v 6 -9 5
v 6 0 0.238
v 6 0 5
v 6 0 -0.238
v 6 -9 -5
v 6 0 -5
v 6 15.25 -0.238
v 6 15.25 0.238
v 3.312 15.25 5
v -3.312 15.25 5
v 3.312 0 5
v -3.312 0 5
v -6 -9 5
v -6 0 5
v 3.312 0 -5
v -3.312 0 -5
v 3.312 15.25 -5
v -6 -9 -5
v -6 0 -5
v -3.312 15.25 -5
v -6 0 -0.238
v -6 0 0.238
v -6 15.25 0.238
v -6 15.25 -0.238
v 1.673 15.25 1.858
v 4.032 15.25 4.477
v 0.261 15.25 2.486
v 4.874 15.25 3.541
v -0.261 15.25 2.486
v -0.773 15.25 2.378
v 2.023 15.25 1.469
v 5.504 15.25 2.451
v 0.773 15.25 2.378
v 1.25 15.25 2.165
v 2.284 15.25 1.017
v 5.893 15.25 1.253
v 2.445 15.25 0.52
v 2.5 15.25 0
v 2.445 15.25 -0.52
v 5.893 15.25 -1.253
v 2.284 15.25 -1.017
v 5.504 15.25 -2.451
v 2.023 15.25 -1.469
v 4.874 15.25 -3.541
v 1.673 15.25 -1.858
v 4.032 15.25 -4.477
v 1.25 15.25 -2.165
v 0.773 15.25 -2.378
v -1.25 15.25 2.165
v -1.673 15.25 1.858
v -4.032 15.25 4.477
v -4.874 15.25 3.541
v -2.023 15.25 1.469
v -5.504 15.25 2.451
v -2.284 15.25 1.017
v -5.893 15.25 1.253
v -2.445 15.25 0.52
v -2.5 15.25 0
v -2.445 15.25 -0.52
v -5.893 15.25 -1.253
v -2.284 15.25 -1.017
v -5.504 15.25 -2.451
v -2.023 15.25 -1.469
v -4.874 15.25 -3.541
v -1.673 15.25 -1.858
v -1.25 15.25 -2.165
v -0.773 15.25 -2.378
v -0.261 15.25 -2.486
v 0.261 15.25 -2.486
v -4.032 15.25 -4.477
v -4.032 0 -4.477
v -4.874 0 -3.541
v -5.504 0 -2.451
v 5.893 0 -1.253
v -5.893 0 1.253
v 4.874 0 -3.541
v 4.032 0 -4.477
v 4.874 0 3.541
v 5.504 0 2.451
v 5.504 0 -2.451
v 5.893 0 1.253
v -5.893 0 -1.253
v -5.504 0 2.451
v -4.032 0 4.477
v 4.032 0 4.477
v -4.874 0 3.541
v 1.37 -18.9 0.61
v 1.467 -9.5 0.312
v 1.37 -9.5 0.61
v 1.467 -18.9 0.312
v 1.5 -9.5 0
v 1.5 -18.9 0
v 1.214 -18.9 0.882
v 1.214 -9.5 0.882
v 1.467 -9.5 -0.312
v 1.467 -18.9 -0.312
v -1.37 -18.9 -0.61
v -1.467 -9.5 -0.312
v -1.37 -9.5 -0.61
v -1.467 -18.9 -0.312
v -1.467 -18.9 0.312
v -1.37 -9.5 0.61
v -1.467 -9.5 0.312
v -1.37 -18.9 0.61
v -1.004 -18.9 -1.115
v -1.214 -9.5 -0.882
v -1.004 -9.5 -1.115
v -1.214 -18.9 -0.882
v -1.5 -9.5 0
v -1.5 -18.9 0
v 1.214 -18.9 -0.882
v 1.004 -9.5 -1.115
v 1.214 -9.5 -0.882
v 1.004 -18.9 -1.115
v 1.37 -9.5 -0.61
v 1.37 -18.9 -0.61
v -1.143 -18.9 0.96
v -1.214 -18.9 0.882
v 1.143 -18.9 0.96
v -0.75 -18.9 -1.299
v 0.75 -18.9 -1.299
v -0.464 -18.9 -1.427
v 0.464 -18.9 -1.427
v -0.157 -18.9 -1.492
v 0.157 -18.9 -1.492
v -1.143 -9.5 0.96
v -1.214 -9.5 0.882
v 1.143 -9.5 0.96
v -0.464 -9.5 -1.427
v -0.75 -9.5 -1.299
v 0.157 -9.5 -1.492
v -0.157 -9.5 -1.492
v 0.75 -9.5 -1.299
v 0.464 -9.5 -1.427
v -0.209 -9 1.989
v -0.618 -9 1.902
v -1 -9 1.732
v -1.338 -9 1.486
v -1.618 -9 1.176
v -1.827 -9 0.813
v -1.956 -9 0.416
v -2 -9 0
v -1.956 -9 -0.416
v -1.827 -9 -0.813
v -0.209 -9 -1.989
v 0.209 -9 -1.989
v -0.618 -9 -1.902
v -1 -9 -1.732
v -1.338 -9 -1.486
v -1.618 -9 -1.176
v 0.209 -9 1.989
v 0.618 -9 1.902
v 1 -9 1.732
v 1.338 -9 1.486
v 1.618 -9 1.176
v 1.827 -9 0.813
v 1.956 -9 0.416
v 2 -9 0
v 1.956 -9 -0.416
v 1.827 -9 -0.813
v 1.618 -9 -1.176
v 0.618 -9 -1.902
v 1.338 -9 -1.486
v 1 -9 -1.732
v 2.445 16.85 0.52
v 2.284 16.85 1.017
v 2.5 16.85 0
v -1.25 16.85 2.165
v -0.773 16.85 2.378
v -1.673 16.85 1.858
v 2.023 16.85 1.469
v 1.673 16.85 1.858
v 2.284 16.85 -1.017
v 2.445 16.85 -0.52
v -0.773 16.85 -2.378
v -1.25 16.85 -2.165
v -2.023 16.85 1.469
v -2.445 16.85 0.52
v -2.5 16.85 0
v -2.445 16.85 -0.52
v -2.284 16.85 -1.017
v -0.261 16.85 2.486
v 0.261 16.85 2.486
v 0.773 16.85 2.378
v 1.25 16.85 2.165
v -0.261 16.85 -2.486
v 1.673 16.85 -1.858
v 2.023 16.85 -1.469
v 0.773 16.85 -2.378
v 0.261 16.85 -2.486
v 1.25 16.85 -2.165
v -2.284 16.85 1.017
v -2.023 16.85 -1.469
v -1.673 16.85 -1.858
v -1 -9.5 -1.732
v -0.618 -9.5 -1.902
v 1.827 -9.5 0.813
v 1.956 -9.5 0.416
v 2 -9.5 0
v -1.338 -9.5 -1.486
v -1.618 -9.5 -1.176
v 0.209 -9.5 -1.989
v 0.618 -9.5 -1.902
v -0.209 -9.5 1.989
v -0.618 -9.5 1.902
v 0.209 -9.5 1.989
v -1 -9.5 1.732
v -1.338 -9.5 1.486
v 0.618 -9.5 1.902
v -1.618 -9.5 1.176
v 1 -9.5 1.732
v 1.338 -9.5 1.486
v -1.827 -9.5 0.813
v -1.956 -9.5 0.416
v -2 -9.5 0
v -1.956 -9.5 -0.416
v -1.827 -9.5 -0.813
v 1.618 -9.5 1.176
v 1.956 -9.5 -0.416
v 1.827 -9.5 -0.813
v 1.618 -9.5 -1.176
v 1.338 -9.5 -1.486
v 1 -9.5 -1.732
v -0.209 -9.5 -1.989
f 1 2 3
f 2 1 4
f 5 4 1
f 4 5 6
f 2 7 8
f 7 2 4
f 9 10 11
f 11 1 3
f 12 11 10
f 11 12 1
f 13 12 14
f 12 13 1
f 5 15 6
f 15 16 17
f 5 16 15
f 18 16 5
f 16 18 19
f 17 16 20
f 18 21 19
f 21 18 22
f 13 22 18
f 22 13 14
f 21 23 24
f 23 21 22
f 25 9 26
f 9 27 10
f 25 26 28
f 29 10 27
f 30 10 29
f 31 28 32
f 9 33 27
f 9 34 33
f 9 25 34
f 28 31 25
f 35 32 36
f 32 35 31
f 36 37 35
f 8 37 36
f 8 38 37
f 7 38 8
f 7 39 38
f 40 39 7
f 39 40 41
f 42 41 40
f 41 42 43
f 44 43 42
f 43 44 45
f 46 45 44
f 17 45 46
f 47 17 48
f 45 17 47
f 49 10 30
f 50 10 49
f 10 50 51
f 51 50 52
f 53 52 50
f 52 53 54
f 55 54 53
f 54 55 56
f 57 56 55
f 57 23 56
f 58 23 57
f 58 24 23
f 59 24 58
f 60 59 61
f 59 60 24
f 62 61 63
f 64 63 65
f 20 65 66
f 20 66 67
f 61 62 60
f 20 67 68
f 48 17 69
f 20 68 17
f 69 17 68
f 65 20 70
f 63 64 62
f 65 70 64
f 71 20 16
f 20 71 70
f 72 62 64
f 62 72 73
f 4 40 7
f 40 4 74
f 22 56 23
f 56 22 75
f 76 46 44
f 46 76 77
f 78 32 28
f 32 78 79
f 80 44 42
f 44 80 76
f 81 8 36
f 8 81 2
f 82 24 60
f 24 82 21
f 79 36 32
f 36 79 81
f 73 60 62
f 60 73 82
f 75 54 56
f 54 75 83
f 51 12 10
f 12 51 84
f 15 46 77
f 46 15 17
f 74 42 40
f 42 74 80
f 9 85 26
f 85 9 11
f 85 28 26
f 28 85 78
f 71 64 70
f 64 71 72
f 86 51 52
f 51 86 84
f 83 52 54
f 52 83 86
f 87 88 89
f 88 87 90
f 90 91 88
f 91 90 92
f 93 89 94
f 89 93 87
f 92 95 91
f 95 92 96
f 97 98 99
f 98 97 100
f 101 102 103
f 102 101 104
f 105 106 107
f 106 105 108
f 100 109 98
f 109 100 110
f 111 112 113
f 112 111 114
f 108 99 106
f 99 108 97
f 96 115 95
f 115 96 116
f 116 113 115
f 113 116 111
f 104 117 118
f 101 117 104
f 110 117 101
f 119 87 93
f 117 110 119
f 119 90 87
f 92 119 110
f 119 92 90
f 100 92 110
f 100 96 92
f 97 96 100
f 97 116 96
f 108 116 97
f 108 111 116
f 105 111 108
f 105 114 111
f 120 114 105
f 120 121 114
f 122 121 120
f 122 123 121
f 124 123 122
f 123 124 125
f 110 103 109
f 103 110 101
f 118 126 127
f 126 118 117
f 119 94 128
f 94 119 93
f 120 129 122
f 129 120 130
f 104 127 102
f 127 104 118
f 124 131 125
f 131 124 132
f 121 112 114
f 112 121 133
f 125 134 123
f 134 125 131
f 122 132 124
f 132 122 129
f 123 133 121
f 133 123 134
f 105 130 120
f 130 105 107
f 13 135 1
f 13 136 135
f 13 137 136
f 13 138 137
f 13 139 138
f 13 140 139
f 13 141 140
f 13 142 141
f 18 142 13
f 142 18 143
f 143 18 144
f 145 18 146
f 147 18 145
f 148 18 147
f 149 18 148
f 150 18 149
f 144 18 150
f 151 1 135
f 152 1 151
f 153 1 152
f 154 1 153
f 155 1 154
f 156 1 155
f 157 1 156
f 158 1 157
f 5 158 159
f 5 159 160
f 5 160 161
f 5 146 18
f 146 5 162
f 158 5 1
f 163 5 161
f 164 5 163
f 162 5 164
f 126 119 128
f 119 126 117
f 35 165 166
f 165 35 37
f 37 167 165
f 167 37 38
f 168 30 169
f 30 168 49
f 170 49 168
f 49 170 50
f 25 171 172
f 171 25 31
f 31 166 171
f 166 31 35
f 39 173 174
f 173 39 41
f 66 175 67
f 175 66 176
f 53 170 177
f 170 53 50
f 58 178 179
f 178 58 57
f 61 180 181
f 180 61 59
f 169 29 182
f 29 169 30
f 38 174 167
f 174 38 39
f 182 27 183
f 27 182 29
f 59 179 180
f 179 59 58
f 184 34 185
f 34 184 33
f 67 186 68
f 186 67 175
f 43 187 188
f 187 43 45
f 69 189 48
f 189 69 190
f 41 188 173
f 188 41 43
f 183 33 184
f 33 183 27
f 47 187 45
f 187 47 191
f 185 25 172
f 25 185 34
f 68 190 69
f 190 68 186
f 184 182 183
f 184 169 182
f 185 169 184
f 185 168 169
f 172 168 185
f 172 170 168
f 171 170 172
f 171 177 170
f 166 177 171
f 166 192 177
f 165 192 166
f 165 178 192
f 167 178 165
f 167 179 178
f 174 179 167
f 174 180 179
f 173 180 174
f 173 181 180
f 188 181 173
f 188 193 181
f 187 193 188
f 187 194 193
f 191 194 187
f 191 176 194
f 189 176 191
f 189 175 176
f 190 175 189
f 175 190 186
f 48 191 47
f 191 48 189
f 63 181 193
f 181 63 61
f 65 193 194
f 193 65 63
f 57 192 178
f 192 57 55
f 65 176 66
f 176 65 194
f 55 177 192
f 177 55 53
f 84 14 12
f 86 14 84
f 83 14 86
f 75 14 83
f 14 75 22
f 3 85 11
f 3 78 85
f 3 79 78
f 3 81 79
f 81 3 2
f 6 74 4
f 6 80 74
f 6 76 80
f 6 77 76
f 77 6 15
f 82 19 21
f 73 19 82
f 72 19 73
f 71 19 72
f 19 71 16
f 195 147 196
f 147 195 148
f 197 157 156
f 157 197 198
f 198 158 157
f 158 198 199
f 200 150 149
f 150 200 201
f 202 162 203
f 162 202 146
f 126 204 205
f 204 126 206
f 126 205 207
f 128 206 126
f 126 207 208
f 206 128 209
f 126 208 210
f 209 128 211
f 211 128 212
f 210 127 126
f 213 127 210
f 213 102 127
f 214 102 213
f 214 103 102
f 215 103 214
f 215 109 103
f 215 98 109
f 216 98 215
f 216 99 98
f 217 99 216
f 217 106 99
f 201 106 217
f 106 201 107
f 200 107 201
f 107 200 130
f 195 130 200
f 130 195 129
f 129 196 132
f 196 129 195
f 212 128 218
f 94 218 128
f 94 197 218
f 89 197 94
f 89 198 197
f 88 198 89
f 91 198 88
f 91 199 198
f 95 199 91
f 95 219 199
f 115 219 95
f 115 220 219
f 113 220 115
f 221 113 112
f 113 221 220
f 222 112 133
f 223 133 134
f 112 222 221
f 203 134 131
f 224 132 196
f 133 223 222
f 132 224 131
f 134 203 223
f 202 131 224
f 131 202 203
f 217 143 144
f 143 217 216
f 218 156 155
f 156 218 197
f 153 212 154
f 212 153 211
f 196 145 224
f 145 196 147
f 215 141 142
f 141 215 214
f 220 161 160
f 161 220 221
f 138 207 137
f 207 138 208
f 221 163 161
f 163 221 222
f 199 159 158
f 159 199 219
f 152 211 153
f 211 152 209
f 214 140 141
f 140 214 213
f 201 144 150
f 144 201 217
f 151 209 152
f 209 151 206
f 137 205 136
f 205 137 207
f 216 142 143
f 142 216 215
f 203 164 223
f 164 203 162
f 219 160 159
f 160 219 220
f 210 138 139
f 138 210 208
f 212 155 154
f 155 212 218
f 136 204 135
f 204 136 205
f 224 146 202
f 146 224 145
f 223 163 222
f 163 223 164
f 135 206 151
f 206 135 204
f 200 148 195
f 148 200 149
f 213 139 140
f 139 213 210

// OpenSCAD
// file: ../settings.scad
// Common settings used by all scad files.

// ALL UNITS IN MILLIMETERS (MM)!!!

$fn = 30;//low-res but fast to render
//$fn = 50;//higher-res but slow to render

pi = 3.1415926535897932384626433832795;

max_footprint = 150; // 15x15 cm

bottom_clearance = 10;
bottom_clearance = 25.4/2+10;
//bottom_clearance = 30;

shell_alpha = 0.215;
//shell_alpha = 1.0;

tolerance = 0.5;

// Flat countersunk M2.5mm x 0.45mm machine screw.
screw_thread_diameter = 2.5;//2.8;//2.75;//2.4?
screw_thread_length = 5;//?
screw_head_diameter = 4.75; // M2.5
//screw_head_diameter = 5.2; // M3
screw_head_height = 1.5;//2;

screw_thread_diameter2 = 2;

unit_thickness = 5;
u = unit_thickness;

shell_thickness = unit_thickness;

// Show flags.
show_platform = 0;
show_head = 1;
show_head_shell = 0;
show_head_electronics_bb = 0;
show_battery = 1;
show_foot_cube = 0;
show_torso = 0;
show_motor = 0;
show_motor_plates = 1;
show_motor_inner_plates = 1;
show_motor_outer_plates = 1;
show_wheel = 0;//obsolete
show_tracks = 1;//
show_track_wheels = 1;
show_caster = 0;
show_rpi = 1;
show_vertical_plates = 1;//
show_horizontal_plates = 1;//
show_caster_plates = 0;//obsolete?
show_camera = 1;
show_screen = 0;
show_edge_mount = 1;
show_sonar_mount = 1;
show_recharge_mount = 1;
show_conduit = 1;
show_torso_shell = 1;
show_recharge_dock = 0;
show_head_tilt_axis = 0;
show_rpi_camera_axis = 0;
show_laser_axis = 0;

head_vertical_angle_tilt = 0;
//head_vertical_angle_tilt = 30;//max
//head_vertical_angle_tilt = 10;

torso_height = 120+20;

base_plate_diameter = max_footprint-unit_thickness*2;
base_plate_frame = 0;

head_height = 50;
head_offset_z = max_footprint/2;
head_middle_cutout = 85;

rpi_with_four_hats_and_clearance = 76;

qrd1114_w = 6.10;
qrd1114_l = 4.39;
qrd1114_h = 4.65;

dock_radius = 10;
dock_gripper_border = 2;
dock_gripper_instep = 0.9;
dock_gripper_cutout_tapper = 50;
dock_receiver_height = 5;

// Patriod Fuel+ 9000 mAh
battery_length = 90;
battery_width = 57;
battery_height = 23;
battery_offset_z = 30;//4;

wheel_diameter = 50;
wheel_offset_x = 65;
wheel_offset_z = wheel_diameter/2;
wheel_axle_diameter = 5;

//caster_diameter = 19.05; // 0.75 inches
caster_diameter = 25.45; // 1 inches
//caster_diameter = 15.875; // 5/8 inches
caster_holder_diameter = 30;//31;
caster_offset_y = base_plate_diameter/2 - caster_holder_diameter/2;

arduino_offset_x = 0;
arduino_offset_y = 0;
arduino_offset_z = 67;
arduino_offset_x2 = 0;
arduino_offset_y2 = -20;
arduino_offset_z2 = torso_height+bottom_clearance;

horizontal_plate_width = unit_thickness*8*2 - unit_thickness*2;
horizontal_plate_depth = unit_thickness*8*2;

vertical_plate_width = horizontal_plate_depth;
vertical_plate_height = unit_thickness*8;
vertical_plate_offset_x = wheel_offset_x-22.5;
vertical_plate_offset_z = vertical_plate_height/2 + unit_thickness/2;

vertical_battery_plate_height = 100 - 15;

caster_plate_width = horizontal_plate_width + unit_thickness*2;
caster_plate_mount_length = unit_thickness*4;
caster_plate_width_minor = caster_holder_diameter;

motor_switch_length = 20;
motor_switch_thickness = 6.5;
motor_switch_height = 11;
motor_switch_height_leads = 23;
motor_switch_on_height =  13.3;
motor_switch_hole_diameter = 2.5;
motor_switch_hole_offset_z = 6.5;//this plus diameter/2 is hole center from switch top
motor_switch_hole_spacing = 7.1;// holes are diameter/2 from this

motor_length = 60;
motor_width = 25;
motor_collar_width = 7;
motor_collar_height = 2.5;
motor_axle_width = 4;
motor_axle_height = 9.5;
motor_offset_x = 10;
//motor_offset_y = motor_width/2+5;
motor_offset_y = unit_thickness*3.5;
motor_offset_z = vertical_plate_height/2 - unit_thickness/2;//4;//30;
motor_mount_holes_dist = 17;
// motor countersink hole
motor_mount_holes_width = 3; // M3
motor_mount_holes_head_height = 2.2;
motor_mount_holes_head_width = 5.8;
motor_bearing_outer_diameter = 10;
motor_bearing_inner_diameter = 5.95;
motor_bearing_thickness = 2.5;

motor_unimount_idler_axle_d = screw_thread_diameter;
//motor_unimount_spacer_depth = 0.1;//too small
motor_unimount_spacer_depth = 0.5;

motor_arm_offset_y = -u*3;
motor_arm_offset_z = u*.5;

motor_plate_width = vertical_plate_width;
motor_plate_height = vertical_plate_height;
motor_plate_thickness = unit_thickness;
motor_plate_offset_z = vertical_plate_offset_z;

motor_plate_middle_thickness = 5;

wheel_hub_offset = u*3;

motor_hole_height_offset = -5;

nylon_spacer_outer_diameter = 6.35;
nylon_spacer_inner_diameter = 3.302;
nylon_spacer_length = 12.7;

track_width = unit_thickness*3;
track_offset_x = -50;
track_offset_z = .1;
//track_wheel_radius = 19;//original
track_wheel_radius = 14;
//track_wheel_hole_radius = (nylon_spacer_outer_diameter+1)/2;
track_wheel_hole_radius = motor_bearing_outer_diameter/2;

track_driver_hole_radius = (motor_axle_width)/2 + 0.1;
track_driver_set_screw_head_d = 4.1;
track_driver_set_screw_shaft_d = 2.4;
//track_wheel_width = 13.5;//original
track_wheel_width = u*2;
track_wheel_width_buffer = u*0.25;
track_offset = 3;        //distance from chassis
track_wheel_offset = track_offset;
//track_length = 250; // see tread_triangle.py, too big
//track_length = 240; // see tread_triangle.py
//track_length = 238; //inc/dec in 10 unit increments so notches match idlers
track_length = 228; //inc/dec in 10 unit increments so notches match idlers
track_radius = track_length/2/pi;
track_wheel_show_fancy = 1;
track_wheel_gap = track_wheel_width + track_wheel_width_buffer*2;
track_axle_bearing_diameter = motor_bearing_inner_diameter - 0.1;
track_tensioner_radius = 12;
track_nut_height = 3.5; //TODO
track_punchout_thickness = 0.25;//should be the same as the minimum layer thickness

head_slew_bearing_outer_diameter = 115;
head_slew_bearing_ring_thickness = 20;
head_slew_bearing_inner_diameter = head_slew_bearing_outer_diameter - head_slew_bearing_ring_thickness;
//head_slew_bearing_hole_diameter = head_slew_bearing_inner_diameter - head_slew_bearing_ring_thickness;
head_slew_bearing_hole_diameter = 12+tolerance; // slip ring https://www.adafruit.com/products/775
//head_slew_bearing_ball_diameter = 5;
head_slew_bearing_ball_diameter = 2.5; //u/2;
head_slew_bearing_height = u;//head_slew_bearing_ball_diameter*2;
head_slew_bearing_gap = 0.5;
head_slew_bearing_slew_gap = 0;
head_slew_bearing_gap_factor = 0.1;

neck_strut_width = u*7;
neck_strut_height = u*18;
neck_strut_spacing = u*8;

show_outer_race = 0;
show_inner_race_a = 1;
show_inner_race_b = 1;
show_balls = 0;
// main file
include <../settings.scad>;

module make_motor(flip=0){
    rotate([0,90+(180*flip),0]){
        
        difference(){
            cylinder(h=motor_length, d=motor_width, center=true);
            
            translate([motor_mount_holes_dist/2,0,motor_length/2])
            cylinder(h=motor_length, d=motor_mount_holes_width, center=true);
            
            translate([-motor_mount_holes_dist/2,0,motor_length/2])
            cylinder(h=motor_length, d=motor_mount_holes_width, center=true);
        }
        
        translate([0,0,motor_collar_height/2+motor_length/2])
        cylinder(h=motor_collar_height, d=motor_collar_width, center=true);
        
        translate([0,0,motor_axle_height/2+motor_collar_height/2+motor_length/2])
        cylinder(h=motor_axle_height, d=motor_axle_width, center=true);
    }
}

module make_pololu_motor_163F3F_axle(d=3, h=9.9){
    notch_thickness = 2.46;
    difference(){
        color("red")
        cylinder(d=d, h=h);
        color("blue")
        translate([0,notch_thickness,0])
        cube([d,d,d*h], center=true);
    }
}

module make_pololu_motor_163F3F(){
    //https://www.pololu.com/product/2361
    //24.25
    //25.5
    gearbox_length = 9;
    housing_length = 15.25;
    housing_d = 12.05;
    union(){
    
        // motor housing
        translate([0,housing_length/2-1/2,0])
        intersection(){
            cube([12, housing_length+1, 10], center=true);
            rotate([90,0,0])
            cylinder(d=housing_d, h=housing_length+1, center=true);
        }
        translate([0,housing_length+1.6,0])
        rotate([90,0,0])
        cylinder(d=5, h=1.6);
    
        // gear box
        translate([0,-gearbox_length/2,0])
        cube([12, gearbox_length, 10], center=true);
        
        // axle collar
        translate([0,-gearbox_length,0])
        rotate([90,0,0])
        cylinder(d=4, h=0.5);
        
        // axle
        translate([0,-gearbox_length,0])
        rotate([90,0,0])
        //cylinder(d=3, h=9.9);
        make_pololu_motor_163F3F_axle();
    }
}

//make_motor();
make_pololu_motor_163F3F();
